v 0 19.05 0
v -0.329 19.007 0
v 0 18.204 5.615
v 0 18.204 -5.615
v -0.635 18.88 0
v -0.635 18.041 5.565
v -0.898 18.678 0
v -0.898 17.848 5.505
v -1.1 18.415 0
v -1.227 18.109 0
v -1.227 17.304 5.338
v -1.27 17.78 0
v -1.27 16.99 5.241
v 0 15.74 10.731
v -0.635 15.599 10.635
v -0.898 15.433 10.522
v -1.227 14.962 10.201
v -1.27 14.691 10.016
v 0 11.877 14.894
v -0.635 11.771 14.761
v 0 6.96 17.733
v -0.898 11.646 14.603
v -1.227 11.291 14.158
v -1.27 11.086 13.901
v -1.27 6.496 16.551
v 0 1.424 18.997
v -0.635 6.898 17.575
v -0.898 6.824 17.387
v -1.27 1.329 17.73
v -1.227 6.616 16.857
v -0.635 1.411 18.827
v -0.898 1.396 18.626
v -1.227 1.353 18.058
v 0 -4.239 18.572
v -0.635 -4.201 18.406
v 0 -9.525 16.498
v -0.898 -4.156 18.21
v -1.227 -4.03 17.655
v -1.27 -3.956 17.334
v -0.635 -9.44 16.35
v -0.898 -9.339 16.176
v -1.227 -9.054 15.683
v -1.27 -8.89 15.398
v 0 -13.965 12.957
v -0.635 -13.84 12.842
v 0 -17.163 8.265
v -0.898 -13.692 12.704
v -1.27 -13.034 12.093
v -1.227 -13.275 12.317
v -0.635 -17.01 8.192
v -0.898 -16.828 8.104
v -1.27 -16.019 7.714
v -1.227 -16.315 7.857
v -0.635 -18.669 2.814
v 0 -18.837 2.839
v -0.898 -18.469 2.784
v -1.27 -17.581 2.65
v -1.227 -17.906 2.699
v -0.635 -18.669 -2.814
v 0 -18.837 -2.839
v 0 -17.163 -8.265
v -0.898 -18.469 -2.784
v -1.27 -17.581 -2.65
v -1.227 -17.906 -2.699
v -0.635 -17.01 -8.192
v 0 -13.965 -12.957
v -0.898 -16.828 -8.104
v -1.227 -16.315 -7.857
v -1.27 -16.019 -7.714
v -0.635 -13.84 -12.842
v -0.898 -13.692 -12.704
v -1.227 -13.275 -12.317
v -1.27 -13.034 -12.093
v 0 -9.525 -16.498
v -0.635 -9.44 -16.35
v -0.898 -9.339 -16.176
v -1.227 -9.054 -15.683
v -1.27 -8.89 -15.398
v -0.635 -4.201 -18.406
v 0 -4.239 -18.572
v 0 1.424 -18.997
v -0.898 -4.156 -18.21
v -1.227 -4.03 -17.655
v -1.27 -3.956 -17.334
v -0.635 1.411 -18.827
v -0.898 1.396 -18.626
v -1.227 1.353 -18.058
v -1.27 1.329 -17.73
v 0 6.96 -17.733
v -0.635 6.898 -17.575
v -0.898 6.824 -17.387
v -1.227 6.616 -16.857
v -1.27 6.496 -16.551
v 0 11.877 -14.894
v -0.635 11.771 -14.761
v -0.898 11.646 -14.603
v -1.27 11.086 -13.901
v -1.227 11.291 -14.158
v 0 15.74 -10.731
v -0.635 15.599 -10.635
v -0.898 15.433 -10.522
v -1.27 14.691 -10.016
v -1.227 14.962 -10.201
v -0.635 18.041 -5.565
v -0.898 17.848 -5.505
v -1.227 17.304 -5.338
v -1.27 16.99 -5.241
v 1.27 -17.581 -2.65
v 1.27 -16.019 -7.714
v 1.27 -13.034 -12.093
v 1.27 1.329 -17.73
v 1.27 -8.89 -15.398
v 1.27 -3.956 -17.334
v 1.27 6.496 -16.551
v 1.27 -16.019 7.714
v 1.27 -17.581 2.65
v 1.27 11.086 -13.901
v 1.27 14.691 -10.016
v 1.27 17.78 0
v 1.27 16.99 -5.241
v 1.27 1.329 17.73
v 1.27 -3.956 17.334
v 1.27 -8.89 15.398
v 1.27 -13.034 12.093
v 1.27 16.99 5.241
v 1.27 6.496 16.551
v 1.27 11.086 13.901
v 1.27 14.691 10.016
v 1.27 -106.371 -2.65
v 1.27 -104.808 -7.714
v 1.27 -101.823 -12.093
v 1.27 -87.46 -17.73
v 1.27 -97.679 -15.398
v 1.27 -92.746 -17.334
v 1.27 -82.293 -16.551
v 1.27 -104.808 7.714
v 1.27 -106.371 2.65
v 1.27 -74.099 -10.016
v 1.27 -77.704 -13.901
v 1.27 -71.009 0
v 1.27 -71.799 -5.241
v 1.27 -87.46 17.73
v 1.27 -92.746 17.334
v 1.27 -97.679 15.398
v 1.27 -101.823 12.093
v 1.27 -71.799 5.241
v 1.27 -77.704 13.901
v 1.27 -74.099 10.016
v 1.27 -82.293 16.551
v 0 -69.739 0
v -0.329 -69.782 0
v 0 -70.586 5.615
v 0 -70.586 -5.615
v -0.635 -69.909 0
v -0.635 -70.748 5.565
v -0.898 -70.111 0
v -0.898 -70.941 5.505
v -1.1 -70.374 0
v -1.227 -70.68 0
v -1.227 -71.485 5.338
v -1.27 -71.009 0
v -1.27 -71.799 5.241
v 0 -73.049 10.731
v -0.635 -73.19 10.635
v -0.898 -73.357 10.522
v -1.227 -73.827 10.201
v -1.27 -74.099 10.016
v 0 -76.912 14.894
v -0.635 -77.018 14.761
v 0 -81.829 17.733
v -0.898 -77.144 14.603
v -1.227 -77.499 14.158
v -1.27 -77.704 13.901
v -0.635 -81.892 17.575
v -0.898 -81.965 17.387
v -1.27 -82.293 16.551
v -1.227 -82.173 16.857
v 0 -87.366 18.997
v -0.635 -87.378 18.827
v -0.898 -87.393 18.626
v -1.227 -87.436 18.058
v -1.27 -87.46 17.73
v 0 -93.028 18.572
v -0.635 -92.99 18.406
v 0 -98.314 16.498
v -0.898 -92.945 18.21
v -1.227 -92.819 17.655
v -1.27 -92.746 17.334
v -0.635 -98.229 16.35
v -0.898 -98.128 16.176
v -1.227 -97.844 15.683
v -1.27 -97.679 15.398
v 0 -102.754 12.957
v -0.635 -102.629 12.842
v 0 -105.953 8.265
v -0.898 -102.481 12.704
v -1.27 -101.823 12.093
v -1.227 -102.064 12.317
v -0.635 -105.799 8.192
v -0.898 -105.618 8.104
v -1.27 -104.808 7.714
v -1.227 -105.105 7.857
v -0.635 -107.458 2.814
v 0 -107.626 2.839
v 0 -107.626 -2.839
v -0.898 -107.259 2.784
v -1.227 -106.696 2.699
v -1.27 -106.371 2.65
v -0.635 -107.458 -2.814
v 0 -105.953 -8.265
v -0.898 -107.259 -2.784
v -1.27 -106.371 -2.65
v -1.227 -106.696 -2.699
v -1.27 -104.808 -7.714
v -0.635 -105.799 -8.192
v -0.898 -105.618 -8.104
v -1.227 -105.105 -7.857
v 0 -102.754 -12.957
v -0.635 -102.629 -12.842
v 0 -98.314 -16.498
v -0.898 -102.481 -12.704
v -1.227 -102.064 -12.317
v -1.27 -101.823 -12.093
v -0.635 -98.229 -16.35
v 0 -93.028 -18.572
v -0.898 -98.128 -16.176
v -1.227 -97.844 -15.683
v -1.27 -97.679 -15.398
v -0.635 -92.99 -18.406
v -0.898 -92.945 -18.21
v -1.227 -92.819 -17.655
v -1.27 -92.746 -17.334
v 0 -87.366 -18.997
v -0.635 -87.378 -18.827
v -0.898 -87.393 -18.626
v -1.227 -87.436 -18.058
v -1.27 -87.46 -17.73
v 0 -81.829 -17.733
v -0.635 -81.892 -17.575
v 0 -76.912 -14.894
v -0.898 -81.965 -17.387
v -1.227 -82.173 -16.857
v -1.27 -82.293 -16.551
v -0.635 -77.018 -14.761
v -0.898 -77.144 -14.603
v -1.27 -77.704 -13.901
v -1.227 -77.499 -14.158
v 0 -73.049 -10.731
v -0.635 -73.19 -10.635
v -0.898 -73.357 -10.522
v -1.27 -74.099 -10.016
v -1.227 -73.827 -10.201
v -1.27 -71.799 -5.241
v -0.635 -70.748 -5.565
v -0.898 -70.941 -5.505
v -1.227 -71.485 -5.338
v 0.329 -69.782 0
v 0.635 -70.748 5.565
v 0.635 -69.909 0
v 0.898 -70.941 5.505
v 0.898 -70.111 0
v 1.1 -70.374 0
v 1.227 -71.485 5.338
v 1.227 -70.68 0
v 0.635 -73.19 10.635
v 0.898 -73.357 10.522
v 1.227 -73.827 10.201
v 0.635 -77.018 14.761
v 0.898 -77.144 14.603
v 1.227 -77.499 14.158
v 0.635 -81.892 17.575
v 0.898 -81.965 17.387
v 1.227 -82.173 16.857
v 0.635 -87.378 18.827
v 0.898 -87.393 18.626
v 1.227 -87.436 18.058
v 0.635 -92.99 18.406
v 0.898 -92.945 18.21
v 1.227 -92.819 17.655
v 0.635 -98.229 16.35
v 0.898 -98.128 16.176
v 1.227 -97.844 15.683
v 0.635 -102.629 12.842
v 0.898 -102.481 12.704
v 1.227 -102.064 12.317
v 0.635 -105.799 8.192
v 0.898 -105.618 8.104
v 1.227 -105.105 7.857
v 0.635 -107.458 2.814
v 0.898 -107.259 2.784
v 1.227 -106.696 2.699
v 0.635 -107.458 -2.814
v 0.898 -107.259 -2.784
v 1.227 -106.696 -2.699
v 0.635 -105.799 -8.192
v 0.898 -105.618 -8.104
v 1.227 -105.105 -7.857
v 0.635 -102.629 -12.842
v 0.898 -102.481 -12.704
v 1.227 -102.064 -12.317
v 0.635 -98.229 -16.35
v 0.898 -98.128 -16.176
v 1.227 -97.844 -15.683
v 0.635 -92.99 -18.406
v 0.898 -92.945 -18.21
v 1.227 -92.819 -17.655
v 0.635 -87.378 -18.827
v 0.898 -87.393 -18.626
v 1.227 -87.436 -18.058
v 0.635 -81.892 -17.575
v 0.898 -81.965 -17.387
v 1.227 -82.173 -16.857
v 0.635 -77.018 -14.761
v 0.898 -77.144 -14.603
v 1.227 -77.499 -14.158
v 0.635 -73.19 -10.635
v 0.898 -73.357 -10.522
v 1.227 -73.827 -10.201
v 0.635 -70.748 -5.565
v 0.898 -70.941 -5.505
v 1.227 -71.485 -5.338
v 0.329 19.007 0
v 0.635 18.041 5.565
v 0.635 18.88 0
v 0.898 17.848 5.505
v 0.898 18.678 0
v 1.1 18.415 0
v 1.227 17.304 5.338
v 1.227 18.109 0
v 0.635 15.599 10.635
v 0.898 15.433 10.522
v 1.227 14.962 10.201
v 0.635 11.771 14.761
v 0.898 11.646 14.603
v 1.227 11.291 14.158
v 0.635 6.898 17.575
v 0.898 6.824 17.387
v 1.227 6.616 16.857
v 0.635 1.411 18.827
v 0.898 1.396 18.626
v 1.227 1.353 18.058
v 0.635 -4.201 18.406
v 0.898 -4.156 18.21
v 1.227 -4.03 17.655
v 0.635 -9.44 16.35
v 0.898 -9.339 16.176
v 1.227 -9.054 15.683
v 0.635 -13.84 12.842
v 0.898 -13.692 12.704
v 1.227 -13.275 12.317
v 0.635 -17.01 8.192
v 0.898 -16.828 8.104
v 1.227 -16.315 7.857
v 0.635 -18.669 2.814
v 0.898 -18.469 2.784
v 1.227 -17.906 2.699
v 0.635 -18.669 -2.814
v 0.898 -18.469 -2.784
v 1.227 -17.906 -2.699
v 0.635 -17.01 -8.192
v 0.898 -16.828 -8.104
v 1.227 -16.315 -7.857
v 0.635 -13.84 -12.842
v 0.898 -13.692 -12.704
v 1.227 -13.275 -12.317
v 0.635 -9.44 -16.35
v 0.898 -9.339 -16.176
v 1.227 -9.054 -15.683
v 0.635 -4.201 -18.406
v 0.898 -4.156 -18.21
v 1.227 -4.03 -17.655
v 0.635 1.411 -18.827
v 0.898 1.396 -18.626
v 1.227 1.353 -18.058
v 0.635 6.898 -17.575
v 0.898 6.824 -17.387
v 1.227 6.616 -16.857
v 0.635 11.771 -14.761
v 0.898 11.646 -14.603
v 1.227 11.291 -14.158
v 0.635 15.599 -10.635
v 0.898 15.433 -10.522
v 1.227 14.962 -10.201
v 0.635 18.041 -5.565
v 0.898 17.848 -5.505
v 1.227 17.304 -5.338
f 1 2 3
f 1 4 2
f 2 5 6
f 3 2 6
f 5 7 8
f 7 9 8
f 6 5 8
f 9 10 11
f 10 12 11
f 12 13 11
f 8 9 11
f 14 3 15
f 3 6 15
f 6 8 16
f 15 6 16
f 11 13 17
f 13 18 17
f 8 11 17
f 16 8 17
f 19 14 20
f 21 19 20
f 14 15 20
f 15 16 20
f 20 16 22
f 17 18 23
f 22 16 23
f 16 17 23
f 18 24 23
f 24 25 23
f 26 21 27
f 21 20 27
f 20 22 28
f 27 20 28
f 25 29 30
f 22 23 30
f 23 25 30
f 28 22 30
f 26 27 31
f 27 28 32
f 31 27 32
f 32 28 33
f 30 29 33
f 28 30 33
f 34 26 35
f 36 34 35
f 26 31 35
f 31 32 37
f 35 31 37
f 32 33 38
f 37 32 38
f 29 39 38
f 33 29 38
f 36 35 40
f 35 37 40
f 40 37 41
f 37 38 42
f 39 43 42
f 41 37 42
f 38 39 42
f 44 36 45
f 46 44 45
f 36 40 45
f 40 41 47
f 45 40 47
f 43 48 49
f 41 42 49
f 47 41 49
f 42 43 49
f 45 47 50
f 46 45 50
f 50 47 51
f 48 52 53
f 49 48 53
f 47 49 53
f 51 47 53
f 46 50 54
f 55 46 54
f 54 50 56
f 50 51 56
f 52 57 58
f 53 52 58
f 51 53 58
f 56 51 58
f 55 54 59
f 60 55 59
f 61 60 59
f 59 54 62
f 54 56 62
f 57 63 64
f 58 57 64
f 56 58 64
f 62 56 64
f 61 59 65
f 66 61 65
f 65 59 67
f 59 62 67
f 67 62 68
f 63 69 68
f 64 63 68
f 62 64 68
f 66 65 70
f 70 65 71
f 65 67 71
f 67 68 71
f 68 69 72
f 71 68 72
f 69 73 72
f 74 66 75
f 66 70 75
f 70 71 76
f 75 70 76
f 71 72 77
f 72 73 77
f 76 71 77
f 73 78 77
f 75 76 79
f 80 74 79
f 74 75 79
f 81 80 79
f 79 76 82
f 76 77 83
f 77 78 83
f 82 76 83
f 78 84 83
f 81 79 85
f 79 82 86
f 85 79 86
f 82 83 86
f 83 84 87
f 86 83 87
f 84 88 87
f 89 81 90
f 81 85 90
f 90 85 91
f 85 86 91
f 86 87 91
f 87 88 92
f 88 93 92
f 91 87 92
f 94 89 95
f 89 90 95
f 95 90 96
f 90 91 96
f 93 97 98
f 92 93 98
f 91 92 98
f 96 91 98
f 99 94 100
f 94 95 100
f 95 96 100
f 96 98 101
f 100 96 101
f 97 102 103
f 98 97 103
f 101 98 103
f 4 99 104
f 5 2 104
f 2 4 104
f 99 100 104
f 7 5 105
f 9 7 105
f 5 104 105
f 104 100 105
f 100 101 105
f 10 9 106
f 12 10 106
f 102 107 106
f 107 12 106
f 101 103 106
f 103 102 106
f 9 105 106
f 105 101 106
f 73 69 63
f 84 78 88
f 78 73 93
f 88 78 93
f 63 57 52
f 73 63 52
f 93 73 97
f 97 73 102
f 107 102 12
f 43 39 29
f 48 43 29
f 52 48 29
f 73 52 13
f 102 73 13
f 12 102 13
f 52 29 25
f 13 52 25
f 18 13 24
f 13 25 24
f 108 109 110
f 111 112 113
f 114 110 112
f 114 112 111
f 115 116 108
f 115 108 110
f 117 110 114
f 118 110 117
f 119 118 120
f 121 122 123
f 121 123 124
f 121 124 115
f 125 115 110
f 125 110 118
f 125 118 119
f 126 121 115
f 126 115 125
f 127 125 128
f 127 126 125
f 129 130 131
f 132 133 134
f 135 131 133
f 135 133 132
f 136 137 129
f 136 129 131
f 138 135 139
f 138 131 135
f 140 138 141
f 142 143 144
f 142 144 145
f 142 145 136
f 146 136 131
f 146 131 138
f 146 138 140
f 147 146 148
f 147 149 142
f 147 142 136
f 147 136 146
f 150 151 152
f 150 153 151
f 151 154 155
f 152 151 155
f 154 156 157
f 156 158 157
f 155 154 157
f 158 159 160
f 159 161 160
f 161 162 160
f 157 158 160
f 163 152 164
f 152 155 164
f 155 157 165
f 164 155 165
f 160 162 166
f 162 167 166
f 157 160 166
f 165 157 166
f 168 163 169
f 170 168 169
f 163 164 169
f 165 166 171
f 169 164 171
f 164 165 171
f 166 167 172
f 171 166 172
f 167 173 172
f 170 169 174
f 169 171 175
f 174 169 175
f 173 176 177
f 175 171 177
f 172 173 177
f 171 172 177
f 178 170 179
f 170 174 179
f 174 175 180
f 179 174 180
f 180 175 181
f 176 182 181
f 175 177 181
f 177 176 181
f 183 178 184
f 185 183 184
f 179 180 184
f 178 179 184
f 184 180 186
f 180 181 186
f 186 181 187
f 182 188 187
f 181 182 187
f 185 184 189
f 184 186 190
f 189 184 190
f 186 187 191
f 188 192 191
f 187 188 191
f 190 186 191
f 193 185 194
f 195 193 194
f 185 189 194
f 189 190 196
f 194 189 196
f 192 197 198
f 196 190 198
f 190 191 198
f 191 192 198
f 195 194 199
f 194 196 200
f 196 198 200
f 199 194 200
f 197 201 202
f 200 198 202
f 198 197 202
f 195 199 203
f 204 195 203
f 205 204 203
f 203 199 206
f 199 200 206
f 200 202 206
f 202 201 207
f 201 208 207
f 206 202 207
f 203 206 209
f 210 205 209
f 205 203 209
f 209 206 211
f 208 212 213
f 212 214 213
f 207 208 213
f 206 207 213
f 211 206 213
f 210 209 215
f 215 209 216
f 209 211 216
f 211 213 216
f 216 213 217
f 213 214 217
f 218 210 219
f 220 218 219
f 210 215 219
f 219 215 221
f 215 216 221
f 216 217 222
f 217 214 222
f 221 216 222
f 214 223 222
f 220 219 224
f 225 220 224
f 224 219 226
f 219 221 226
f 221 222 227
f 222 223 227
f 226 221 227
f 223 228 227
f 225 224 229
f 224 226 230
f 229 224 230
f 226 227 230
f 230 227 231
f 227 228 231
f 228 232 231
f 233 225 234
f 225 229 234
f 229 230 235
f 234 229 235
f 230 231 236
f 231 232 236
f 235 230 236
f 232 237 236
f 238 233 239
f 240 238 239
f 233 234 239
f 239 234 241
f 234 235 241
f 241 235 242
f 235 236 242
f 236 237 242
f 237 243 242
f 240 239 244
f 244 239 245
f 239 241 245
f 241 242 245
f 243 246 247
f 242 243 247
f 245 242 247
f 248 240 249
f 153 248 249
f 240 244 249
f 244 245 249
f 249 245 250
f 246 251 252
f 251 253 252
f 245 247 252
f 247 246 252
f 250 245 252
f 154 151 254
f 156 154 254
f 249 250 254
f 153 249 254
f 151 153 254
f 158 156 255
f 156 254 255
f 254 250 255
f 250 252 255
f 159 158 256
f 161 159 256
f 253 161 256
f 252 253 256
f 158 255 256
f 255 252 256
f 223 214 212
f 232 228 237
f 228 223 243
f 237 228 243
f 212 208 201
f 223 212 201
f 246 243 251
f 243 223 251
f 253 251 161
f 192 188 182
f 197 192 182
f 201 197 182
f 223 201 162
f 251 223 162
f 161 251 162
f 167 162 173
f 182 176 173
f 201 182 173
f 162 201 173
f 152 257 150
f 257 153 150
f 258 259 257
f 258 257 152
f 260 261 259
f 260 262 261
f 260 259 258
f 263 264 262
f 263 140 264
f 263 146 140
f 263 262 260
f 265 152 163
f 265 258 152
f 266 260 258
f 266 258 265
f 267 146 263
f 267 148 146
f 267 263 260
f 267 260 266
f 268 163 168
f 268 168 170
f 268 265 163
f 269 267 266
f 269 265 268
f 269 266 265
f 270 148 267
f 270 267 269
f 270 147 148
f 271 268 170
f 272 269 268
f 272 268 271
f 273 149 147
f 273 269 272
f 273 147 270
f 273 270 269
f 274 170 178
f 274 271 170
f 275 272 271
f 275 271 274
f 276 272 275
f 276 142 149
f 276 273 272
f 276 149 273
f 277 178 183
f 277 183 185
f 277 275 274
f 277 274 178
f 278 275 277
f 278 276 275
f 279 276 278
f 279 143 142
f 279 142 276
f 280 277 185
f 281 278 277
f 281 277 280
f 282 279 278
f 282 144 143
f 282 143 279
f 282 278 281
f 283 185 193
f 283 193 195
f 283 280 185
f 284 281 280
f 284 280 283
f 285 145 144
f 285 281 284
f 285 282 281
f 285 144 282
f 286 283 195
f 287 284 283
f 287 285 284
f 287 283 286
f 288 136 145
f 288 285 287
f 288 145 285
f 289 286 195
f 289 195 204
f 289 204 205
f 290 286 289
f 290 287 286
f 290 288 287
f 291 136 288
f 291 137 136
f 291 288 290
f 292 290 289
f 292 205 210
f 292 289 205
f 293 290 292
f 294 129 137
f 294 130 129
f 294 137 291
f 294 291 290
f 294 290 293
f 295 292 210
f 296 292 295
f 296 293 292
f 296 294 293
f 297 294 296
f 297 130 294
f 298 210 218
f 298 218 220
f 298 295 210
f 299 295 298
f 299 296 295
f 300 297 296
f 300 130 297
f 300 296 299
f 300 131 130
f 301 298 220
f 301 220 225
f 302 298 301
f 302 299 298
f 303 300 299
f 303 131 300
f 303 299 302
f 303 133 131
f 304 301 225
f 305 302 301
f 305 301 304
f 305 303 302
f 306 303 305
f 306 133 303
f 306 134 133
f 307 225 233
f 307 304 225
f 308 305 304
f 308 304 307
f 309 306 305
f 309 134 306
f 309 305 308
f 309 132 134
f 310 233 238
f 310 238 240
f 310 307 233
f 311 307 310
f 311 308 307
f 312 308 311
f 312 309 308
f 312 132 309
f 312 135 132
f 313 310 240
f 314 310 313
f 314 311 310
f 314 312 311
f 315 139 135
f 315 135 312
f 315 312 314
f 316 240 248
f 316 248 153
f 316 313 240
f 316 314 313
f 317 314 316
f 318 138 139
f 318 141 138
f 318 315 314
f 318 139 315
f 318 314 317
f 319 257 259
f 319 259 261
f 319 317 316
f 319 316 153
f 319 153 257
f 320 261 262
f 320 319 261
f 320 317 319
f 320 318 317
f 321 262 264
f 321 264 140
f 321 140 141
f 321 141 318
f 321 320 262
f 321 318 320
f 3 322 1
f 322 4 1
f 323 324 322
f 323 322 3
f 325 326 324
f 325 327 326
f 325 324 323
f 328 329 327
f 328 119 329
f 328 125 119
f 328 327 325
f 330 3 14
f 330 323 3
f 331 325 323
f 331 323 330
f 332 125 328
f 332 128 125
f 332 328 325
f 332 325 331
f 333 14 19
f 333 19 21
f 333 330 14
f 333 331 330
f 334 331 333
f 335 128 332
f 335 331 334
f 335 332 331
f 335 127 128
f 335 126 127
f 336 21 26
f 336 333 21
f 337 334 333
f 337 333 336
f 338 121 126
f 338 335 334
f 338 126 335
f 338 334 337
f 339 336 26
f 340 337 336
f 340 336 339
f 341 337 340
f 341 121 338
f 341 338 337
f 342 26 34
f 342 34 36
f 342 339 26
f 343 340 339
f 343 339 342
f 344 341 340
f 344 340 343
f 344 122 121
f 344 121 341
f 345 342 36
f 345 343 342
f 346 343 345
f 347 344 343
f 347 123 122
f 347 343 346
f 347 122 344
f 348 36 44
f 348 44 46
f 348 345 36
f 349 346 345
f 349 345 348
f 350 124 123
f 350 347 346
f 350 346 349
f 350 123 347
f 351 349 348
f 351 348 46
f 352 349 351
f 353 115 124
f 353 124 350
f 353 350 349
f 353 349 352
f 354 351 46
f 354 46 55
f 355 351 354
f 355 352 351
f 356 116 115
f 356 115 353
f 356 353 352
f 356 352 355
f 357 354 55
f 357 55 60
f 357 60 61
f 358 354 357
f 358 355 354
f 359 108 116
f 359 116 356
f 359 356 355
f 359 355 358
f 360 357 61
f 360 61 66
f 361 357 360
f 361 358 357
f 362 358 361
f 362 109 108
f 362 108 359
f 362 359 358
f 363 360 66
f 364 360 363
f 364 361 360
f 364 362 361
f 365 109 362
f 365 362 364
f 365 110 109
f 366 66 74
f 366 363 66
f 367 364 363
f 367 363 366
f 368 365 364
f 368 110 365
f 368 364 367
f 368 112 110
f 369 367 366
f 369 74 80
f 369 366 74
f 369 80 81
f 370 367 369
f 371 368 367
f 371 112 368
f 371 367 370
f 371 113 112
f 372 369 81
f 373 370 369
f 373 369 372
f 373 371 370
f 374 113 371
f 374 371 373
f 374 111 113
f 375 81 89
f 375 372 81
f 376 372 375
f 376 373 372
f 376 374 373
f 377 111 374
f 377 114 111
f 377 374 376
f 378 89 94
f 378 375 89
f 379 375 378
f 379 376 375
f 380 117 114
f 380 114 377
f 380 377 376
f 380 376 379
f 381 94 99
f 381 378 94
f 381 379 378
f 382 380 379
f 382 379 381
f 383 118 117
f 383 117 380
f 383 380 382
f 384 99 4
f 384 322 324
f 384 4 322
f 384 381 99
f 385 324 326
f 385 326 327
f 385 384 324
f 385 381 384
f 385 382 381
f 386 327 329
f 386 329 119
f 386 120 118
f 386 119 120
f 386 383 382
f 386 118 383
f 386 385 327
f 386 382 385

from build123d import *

# Parameters (mm, degrees)
F0_R     = 19.05
F1_DEPTH = 1.27
F2_R     = 1.26999
F2_2_R   = 1.26999


# Not quite as in the source:
# - a fillet or chamfer is up to 0.001 mm smaller than in the source, because OpenCascade refuses the exact size


with BuildPart() as f1:
    # F0 (on Right) → F1 (new body, symmetric)
    with BuildSketch(Plane.YZ):
        with Locations((-88.7891860319, 0)):
            Circle(F0_R)
    extrude(amount=F1_DEPTH, both=True)

    # F2#2 (radius 1.27 in the source; OpenCascade refuses exactly that, so slightly less here)
    f2_2_edges = [f1.edges().sort_by_distance(p)[0] for p in [
        (1.27, -107.839186, 0),
        (-1.27, -107.839186, 0),
    ]]
    fillet(f2_2_edges, radius=F2_2_R)


with BuildPart() as f1b:
    # F0 (on Right) → F1, piece 2 (new body, symmetric)
    with BuildSketch(Plane.YZ):
        Circle(F0_R)
    extrude(amount=F1_DEPTH, both=True)

    # F2 (radius 1.27 in the source; OpenCascade refuses exactly that, so slightly less here)
    f2_edges = [f1b.edges().sort_by_distance(p)[0] for p in [
        (1.27, -19.05, 0),
        (-1.27, -19.05, 0),
    ]]
    fillet(f2_edges, radius=F2_R)


solid = Compound([f1.part, f1b.part])
